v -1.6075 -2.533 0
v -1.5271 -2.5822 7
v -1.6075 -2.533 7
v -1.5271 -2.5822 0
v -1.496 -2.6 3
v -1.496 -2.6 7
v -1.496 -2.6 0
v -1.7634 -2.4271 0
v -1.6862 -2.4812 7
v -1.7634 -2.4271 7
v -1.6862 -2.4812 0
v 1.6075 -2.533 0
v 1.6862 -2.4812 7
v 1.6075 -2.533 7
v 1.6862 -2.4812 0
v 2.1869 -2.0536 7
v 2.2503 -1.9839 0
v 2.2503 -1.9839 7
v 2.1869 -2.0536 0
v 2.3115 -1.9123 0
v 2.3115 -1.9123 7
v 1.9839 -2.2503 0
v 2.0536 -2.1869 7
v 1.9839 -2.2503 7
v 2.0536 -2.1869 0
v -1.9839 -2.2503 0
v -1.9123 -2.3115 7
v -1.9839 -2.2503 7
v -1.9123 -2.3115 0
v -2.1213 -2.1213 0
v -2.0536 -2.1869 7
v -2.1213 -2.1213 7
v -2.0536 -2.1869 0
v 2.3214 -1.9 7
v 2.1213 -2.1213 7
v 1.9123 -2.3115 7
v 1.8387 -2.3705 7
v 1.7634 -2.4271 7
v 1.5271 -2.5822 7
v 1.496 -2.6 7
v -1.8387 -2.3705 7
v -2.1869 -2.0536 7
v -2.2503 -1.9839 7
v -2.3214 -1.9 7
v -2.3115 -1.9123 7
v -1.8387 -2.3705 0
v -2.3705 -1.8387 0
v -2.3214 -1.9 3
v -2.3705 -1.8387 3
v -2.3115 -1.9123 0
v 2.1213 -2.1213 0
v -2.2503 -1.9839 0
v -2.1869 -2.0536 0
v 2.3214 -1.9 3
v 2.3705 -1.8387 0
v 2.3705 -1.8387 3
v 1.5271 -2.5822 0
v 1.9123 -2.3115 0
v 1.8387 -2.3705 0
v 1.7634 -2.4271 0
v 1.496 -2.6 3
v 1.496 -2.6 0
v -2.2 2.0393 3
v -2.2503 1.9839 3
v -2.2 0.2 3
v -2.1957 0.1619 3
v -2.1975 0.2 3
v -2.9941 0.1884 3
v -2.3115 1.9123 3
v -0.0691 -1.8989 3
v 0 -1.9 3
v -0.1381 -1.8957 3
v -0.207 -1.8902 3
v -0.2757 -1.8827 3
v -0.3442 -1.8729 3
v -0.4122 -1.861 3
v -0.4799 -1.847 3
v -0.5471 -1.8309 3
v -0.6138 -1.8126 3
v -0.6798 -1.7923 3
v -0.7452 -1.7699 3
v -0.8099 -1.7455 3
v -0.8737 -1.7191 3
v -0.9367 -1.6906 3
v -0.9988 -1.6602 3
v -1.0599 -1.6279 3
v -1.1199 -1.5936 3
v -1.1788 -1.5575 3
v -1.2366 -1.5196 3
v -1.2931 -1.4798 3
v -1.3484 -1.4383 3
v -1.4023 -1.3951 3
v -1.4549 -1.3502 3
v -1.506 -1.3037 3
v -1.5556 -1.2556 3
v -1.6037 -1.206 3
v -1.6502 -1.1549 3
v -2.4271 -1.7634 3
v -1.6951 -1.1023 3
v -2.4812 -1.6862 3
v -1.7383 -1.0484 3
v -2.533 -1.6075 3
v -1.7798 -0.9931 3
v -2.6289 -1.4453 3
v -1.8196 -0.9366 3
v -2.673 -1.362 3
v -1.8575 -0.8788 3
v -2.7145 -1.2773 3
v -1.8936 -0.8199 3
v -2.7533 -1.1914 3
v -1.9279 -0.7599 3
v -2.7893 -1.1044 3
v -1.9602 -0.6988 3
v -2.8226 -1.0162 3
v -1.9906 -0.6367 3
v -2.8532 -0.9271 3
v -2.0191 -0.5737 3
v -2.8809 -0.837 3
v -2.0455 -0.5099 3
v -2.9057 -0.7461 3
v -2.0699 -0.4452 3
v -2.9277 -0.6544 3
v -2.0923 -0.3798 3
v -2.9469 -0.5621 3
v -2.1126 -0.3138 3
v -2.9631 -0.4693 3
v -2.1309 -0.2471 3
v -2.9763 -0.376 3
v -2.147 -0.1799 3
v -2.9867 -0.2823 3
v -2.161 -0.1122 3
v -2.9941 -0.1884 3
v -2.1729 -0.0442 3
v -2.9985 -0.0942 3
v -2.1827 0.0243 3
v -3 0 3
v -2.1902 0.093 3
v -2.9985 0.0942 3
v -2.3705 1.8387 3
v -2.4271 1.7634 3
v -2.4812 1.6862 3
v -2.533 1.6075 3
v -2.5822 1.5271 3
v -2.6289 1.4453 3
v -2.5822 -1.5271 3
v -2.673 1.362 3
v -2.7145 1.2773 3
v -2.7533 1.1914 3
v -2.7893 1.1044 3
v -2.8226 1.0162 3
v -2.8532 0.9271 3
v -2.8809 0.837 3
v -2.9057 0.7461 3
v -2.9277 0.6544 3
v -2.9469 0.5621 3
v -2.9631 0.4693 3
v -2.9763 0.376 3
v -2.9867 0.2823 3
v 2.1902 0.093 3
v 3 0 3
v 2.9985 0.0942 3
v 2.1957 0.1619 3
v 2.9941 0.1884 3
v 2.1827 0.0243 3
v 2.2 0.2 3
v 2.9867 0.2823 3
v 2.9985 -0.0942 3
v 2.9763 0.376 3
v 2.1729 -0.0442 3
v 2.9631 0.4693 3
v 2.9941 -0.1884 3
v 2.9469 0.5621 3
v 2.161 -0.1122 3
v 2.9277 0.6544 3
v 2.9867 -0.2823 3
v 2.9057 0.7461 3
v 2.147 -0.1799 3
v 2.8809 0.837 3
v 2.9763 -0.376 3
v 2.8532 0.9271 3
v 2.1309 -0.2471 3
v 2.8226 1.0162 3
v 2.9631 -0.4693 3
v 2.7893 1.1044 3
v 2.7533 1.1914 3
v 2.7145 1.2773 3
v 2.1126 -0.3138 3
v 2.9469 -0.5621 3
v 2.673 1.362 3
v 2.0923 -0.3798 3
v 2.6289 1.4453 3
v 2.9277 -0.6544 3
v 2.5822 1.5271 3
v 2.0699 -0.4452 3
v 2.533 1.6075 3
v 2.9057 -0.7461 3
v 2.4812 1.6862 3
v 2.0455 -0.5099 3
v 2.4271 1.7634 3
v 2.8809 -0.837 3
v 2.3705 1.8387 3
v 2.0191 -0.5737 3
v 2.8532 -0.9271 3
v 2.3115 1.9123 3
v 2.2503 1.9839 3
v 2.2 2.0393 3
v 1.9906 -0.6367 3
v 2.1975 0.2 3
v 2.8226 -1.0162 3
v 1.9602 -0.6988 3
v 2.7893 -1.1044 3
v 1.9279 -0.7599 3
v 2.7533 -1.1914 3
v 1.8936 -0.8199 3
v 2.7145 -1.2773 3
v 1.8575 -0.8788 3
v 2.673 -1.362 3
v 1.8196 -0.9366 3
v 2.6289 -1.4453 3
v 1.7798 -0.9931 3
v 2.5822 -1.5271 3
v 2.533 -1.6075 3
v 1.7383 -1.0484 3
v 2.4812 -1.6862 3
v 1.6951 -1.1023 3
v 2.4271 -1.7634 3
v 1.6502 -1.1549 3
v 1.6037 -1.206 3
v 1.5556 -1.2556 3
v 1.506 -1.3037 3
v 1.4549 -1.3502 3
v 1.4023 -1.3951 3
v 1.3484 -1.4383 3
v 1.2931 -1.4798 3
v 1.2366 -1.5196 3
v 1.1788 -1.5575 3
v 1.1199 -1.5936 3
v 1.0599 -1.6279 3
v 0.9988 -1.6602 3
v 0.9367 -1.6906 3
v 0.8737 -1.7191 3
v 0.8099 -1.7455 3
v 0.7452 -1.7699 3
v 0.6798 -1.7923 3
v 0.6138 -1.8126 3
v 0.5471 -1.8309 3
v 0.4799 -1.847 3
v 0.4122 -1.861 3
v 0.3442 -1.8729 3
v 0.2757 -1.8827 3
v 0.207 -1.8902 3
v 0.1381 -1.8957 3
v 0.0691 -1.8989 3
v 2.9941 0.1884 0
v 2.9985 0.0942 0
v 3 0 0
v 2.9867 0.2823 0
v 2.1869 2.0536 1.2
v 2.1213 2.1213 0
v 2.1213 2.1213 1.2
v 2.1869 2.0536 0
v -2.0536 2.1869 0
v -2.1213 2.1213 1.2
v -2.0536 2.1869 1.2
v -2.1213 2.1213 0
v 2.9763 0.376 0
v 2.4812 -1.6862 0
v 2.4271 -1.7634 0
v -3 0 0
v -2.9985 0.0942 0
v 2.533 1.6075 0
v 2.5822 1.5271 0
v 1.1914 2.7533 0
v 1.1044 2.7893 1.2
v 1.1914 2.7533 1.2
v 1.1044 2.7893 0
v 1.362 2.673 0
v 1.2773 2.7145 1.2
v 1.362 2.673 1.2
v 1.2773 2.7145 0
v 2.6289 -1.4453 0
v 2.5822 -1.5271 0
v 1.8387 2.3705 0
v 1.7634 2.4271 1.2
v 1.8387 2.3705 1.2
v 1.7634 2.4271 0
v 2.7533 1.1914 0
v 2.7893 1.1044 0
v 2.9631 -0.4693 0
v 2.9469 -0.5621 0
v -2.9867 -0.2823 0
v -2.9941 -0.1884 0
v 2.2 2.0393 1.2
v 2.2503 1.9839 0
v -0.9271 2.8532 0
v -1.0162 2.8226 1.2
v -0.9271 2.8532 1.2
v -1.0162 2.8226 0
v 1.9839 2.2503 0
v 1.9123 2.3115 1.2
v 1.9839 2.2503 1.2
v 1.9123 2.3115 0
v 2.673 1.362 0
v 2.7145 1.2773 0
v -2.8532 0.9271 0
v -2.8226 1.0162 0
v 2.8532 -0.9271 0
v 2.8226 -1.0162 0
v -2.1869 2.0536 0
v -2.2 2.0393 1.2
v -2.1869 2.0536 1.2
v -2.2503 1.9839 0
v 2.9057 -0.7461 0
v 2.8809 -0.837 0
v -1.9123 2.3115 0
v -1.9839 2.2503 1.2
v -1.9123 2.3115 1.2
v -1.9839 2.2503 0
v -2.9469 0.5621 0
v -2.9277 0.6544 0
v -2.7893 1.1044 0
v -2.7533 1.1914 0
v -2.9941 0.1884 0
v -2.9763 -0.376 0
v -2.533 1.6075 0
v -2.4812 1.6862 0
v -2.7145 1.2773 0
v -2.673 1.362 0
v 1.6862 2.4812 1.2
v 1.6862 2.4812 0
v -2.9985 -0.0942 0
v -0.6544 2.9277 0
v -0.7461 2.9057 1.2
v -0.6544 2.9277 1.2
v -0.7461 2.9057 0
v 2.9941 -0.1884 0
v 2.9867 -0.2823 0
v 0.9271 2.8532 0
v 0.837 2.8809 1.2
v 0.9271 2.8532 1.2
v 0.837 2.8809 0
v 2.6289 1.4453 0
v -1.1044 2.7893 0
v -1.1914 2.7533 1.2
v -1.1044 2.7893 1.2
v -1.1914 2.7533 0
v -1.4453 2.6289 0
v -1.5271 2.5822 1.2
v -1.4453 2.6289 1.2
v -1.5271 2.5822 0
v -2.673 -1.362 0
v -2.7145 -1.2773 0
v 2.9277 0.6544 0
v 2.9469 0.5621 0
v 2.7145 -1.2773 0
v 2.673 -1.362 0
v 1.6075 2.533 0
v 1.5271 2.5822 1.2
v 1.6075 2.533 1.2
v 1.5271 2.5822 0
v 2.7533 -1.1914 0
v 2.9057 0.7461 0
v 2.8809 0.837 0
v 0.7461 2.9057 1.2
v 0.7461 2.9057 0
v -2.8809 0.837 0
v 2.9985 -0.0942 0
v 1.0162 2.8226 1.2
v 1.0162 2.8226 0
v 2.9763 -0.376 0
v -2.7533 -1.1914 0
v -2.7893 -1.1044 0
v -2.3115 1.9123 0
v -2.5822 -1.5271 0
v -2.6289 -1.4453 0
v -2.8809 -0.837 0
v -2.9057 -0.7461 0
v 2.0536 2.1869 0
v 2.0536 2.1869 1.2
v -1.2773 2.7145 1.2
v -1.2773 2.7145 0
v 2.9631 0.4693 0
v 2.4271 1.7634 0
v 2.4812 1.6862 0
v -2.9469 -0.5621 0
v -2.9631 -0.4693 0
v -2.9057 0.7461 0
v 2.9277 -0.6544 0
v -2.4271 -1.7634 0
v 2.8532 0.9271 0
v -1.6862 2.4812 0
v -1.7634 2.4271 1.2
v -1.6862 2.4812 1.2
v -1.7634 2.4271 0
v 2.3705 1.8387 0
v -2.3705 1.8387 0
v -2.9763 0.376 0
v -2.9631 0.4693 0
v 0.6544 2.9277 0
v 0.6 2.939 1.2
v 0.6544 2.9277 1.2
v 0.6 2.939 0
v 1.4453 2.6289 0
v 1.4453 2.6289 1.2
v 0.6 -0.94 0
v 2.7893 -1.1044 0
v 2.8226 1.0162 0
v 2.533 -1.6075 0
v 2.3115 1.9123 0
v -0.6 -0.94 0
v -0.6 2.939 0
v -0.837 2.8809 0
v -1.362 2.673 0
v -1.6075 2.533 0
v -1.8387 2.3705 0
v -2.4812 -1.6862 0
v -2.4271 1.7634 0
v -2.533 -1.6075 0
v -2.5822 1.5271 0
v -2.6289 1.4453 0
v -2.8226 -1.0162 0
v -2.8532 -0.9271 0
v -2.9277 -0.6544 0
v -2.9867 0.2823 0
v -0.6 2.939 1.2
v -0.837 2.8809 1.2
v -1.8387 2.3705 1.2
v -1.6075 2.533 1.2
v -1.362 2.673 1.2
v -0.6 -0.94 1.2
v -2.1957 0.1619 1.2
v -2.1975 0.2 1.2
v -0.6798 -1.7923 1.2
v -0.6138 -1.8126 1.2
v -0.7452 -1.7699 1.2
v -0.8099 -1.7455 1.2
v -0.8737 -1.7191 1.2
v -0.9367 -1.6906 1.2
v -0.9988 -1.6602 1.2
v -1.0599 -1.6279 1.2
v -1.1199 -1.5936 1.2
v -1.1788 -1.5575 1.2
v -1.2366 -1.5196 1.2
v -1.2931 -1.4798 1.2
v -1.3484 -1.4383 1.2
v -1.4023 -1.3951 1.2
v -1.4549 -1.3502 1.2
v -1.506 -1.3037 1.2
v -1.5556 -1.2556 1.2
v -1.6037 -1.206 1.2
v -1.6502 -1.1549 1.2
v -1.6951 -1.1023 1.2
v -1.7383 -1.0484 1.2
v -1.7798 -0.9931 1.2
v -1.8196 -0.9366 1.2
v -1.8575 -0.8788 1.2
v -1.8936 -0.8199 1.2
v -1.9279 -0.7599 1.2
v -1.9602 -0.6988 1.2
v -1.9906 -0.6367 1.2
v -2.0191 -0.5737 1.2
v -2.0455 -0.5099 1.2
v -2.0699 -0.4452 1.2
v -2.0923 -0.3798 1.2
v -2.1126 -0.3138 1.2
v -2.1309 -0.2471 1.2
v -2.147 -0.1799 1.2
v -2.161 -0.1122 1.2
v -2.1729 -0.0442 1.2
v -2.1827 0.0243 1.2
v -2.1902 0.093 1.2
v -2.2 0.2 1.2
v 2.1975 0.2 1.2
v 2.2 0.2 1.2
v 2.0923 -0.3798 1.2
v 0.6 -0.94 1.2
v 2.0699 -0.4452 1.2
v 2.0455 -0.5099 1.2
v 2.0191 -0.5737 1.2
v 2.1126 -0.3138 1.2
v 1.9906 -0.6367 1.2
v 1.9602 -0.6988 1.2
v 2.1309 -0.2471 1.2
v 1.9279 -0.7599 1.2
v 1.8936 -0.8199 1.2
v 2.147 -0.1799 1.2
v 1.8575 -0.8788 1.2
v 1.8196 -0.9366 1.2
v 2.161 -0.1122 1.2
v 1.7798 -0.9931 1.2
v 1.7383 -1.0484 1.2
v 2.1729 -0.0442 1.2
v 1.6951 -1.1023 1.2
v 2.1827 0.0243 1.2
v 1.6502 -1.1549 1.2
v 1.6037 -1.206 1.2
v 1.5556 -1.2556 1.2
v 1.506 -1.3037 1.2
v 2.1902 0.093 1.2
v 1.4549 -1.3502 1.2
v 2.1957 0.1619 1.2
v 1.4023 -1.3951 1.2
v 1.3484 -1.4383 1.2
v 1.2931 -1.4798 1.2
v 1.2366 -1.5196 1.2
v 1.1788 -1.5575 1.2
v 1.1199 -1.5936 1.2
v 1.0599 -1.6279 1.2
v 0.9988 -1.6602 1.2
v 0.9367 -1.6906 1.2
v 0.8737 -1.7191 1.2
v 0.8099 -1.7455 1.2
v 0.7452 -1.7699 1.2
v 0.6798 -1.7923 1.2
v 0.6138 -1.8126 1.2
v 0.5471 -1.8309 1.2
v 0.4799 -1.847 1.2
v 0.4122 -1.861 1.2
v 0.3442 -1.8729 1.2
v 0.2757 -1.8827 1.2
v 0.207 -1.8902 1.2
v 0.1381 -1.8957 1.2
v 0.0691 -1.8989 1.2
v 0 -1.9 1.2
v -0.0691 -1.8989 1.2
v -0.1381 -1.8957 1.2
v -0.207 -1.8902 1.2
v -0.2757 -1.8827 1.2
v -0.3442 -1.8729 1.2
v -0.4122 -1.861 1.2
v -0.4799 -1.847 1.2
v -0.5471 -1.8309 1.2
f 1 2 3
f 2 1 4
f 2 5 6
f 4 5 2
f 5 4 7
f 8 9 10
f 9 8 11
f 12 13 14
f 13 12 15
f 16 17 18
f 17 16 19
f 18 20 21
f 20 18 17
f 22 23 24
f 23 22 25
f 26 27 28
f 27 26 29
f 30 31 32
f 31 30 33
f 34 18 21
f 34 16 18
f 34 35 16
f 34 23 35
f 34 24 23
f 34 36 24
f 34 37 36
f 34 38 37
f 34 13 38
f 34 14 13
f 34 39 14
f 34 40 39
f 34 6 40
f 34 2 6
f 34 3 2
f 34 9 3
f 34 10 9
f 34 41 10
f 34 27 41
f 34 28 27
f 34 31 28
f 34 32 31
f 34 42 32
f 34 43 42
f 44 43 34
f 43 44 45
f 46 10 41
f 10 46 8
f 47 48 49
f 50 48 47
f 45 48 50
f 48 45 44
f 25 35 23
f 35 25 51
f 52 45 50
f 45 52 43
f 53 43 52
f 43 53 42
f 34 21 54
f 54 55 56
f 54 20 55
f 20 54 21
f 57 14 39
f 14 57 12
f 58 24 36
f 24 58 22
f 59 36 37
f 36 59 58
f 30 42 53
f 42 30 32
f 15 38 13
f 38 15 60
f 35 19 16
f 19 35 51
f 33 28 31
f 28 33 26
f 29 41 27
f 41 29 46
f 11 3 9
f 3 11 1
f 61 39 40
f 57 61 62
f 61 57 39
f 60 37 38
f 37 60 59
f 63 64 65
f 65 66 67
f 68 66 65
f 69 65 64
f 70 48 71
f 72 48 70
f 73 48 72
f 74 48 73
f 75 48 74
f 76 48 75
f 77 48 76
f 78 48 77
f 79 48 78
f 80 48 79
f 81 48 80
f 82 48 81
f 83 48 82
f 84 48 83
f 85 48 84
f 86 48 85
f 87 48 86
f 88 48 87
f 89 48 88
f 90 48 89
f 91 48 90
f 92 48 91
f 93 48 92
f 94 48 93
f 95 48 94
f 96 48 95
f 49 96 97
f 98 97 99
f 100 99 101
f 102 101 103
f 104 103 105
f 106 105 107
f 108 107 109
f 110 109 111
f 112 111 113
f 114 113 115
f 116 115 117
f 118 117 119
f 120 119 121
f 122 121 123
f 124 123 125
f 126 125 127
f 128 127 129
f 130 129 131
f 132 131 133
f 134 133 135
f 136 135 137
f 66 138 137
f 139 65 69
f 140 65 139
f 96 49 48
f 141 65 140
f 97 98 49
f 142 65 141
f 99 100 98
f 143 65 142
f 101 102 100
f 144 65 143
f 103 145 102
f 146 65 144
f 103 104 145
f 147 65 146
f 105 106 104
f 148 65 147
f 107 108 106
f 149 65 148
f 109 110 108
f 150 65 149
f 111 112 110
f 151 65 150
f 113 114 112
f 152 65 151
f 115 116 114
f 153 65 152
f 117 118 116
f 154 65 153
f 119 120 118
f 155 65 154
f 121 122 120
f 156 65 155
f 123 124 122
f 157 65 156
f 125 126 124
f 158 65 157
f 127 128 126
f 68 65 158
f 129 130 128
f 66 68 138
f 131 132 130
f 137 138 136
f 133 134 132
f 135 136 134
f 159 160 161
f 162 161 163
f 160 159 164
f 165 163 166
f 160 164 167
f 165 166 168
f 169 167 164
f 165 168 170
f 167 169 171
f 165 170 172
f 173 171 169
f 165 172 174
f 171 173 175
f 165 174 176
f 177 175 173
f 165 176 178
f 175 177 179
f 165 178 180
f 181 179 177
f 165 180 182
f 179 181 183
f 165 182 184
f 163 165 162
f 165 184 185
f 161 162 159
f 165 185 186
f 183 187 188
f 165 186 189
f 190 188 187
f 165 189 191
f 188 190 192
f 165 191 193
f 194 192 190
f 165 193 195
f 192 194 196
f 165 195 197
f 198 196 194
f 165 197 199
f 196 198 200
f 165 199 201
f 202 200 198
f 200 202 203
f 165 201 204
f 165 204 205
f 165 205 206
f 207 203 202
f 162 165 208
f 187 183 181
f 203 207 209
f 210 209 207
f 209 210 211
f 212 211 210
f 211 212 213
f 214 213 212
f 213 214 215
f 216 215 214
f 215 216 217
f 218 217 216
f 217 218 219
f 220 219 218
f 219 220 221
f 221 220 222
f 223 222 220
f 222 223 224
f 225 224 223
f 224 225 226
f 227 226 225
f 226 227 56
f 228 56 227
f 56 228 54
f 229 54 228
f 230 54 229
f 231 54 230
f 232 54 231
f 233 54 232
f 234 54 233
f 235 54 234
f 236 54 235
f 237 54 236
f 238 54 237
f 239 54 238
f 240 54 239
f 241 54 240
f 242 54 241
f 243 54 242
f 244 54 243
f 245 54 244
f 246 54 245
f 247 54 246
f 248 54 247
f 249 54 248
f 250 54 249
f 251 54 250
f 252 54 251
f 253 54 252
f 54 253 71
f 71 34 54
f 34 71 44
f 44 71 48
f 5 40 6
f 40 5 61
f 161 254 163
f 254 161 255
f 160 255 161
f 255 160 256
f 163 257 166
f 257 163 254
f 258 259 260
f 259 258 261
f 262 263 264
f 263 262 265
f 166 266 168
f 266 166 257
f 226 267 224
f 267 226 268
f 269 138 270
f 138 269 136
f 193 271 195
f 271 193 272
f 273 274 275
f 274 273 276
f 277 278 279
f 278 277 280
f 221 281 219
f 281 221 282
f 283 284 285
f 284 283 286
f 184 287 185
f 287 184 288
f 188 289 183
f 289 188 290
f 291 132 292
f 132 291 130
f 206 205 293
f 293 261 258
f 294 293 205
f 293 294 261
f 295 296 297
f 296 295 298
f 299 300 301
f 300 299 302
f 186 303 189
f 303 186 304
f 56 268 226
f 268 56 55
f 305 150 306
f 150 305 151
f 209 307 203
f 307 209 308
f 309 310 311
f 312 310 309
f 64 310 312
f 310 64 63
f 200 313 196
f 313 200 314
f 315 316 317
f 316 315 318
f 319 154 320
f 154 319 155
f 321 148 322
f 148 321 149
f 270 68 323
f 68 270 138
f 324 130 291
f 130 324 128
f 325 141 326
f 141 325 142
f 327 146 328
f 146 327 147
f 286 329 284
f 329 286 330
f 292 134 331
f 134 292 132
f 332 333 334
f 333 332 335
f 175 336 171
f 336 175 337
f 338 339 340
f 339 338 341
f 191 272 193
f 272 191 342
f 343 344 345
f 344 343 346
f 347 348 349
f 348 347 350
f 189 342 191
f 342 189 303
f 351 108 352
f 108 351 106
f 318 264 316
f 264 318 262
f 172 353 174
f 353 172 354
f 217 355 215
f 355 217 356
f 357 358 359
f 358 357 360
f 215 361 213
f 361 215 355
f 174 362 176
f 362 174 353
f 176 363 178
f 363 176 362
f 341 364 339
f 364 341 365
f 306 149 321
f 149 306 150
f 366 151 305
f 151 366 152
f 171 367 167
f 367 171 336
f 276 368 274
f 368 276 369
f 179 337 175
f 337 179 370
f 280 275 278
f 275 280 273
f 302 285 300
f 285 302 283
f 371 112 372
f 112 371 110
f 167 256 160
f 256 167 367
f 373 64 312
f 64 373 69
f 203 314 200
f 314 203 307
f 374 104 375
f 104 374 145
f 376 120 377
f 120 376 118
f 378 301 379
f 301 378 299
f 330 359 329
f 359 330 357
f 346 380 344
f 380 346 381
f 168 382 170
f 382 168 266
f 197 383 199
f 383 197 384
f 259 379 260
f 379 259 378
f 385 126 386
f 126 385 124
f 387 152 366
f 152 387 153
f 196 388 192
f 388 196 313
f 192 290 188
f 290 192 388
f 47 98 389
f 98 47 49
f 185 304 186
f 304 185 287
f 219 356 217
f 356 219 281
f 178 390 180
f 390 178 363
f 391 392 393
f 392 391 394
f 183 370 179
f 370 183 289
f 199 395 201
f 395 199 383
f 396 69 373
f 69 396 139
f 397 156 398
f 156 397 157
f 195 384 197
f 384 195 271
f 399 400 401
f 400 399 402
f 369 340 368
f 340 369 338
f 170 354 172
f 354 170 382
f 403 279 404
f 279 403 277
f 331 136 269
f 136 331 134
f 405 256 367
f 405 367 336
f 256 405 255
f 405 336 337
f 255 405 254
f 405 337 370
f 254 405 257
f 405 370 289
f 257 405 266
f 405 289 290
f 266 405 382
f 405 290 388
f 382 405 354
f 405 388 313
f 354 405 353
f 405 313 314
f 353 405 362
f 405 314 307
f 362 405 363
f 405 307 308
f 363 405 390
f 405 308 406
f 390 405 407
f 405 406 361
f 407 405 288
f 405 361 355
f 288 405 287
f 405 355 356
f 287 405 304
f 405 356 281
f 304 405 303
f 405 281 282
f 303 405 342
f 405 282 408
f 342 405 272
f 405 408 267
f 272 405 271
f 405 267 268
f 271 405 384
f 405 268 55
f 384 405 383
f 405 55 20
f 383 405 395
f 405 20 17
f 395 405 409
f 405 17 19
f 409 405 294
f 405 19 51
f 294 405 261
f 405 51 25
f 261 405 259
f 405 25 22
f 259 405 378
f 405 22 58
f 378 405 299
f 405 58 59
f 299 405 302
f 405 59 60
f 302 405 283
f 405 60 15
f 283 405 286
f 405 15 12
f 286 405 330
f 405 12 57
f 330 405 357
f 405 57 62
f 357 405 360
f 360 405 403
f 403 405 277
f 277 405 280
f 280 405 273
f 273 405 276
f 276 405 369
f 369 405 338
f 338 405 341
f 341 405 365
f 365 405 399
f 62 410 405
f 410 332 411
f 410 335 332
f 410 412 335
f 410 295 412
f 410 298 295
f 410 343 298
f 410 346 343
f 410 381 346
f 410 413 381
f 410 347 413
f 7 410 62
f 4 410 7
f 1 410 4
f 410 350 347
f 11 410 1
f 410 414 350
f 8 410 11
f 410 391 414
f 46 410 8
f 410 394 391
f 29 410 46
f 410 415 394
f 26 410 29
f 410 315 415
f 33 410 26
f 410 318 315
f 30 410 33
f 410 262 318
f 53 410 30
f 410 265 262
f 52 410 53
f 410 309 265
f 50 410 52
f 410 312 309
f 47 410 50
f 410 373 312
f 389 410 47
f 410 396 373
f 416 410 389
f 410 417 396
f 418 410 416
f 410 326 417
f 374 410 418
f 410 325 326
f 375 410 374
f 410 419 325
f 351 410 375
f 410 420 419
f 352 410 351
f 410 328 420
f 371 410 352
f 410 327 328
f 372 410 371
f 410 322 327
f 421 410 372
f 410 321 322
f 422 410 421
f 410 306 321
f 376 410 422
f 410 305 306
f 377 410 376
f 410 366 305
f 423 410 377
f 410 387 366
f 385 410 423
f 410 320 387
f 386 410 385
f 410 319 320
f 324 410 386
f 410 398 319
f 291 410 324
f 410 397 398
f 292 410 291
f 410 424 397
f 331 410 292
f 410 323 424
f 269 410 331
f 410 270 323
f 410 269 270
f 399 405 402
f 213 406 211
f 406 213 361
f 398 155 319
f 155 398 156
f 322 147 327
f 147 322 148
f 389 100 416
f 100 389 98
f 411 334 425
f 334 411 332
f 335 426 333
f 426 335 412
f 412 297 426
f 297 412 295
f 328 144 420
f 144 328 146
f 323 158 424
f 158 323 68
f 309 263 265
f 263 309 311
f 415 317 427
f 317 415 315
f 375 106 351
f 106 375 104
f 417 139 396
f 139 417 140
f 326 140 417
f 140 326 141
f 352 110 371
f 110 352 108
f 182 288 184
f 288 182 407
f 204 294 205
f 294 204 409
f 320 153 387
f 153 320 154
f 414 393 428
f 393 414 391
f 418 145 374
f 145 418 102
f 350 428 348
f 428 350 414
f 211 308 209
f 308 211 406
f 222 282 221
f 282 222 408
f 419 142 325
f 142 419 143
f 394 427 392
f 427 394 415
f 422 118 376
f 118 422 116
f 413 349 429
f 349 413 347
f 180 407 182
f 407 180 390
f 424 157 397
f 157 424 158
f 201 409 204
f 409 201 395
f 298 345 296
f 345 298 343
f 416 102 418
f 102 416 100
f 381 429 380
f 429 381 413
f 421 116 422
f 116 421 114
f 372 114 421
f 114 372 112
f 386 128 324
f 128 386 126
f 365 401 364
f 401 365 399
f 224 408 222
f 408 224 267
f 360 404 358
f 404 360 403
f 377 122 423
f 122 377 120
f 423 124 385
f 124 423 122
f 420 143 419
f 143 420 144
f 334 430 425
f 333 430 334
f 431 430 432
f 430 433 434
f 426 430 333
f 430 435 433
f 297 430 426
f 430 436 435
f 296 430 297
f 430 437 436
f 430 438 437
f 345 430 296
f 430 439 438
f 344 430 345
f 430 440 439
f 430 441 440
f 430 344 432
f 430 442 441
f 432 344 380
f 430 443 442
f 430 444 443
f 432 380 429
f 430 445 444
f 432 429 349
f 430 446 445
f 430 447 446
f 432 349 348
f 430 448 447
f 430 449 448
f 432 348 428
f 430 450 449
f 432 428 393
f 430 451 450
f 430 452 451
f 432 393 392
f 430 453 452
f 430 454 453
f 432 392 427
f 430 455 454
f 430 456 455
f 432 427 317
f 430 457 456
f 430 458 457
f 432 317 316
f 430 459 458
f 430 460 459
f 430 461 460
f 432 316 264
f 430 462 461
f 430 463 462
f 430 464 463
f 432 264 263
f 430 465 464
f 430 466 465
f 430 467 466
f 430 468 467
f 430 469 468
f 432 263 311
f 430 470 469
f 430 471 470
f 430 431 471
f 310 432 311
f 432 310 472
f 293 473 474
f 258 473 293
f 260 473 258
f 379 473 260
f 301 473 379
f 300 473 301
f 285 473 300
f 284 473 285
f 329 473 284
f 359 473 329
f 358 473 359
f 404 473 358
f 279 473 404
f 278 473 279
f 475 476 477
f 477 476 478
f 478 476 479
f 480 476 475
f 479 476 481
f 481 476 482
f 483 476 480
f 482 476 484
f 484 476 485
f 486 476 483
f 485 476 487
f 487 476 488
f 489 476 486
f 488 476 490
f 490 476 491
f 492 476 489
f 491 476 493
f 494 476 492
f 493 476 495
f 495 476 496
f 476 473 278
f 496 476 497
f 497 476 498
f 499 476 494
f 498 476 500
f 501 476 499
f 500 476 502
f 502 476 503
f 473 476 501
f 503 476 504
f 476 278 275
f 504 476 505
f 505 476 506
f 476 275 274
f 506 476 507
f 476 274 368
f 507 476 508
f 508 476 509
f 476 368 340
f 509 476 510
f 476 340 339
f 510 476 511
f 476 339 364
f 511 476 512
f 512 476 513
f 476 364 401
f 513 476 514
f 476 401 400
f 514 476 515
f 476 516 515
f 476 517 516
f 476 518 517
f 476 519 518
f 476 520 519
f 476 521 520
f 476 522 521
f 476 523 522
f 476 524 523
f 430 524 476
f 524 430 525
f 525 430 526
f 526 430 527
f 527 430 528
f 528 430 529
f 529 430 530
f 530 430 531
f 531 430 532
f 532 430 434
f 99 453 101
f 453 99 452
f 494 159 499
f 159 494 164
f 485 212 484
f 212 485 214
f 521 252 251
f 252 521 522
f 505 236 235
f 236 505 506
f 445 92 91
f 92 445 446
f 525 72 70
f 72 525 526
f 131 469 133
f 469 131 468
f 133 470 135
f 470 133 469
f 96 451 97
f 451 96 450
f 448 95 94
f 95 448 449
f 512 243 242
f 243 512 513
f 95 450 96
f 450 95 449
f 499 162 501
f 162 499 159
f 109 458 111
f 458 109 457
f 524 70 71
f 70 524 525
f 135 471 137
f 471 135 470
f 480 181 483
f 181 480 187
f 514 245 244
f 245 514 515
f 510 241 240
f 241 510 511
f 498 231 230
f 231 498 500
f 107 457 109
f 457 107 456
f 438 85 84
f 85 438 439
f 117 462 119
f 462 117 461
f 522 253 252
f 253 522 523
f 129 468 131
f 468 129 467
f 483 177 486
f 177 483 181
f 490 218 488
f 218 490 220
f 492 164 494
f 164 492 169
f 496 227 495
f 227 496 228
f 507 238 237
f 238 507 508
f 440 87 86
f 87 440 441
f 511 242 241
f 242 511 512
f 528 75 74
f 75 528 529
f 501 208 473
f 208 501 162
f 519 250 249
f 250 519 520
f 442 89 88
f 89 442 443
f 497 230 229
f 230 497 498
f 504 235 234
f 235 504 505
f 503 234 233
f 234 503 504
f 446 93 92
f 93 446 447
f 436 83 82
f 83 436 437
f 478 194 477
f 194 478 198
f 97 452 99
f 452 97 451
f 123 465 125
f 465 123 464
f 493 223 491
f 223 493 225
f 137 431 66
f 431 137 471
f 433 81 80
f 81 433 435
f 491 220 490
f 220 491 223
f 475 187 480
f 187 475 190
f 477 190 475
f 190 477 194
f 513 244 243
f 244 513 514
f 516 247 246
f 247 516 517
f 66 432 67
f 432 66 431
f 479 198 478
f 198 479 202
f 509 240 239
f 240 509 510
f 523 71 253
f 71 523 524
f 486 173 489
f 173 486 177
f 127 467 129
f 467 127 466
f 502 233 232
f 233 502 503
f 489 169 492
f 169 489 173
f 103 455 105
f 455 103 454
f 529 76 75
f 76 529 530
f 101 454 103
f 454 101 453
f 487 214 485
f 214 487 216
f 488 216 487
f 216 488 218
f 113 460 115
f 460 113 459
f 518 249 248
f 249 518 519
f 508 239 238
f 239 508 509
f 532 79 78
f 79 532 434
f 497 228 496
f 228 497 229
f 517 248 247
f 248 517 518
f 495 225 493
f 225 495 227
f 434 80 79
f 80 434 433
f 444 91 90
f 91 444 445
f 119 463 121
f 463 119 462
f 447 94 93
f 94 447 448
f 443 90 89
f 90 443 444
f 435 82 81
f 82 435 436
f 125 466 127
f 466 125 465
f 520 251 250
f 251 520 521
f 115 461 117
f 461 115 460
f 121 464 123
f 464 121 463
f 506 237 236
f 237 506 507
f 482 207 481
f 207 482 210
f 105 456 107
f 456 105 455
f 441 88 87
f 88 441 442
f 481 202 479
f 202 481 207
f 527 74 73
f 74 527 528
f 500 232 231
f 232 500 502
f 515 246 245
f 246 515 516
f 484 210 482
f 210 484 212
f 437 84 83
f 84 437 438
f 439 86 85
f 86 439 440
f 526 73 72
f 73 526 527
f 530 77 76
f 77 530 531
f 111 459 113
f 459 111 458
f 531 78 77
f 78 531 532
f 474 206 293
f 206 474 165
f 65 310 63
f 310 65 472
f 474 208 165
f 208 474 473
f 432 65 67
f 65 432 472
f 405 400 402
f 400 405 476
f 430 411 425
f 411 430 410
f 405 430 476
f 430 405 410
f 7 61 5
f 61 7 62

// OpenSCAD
$fn=200;
// main cylinder
D=6;
H=1.2 + 1.8;
// cylinder extracted from main culinder
d=4.4;
h=1.2;

// 
twezeersY=3.94;
twezeersX=1.2;

//
holderZ=  4;

intersection(){
 cylinder(d=D,h=H+holderZ); // main cylinder
 translate([-d/2-1,-2.6,3])
   cube([d+2,.70,holderZ]); // remove back.
}
difference(){
   cylinder(d=D,h=H); // main cylinder
    translate([0,.3,h])
   cylinder(d=d,h=1.8); // extract this cylinder
    translate([-d/2.,0.2,h])
   cube([d,d,d]); // front extraction
    translate([-twezeersX/2.,+D/2-twezeersY,0])
   cube([twezeersX,twezeersY,d]); // channel for tweezers
    translate([-d/2,-3.48,0])
   cube([d,d/5,d]); // remove back.
}
